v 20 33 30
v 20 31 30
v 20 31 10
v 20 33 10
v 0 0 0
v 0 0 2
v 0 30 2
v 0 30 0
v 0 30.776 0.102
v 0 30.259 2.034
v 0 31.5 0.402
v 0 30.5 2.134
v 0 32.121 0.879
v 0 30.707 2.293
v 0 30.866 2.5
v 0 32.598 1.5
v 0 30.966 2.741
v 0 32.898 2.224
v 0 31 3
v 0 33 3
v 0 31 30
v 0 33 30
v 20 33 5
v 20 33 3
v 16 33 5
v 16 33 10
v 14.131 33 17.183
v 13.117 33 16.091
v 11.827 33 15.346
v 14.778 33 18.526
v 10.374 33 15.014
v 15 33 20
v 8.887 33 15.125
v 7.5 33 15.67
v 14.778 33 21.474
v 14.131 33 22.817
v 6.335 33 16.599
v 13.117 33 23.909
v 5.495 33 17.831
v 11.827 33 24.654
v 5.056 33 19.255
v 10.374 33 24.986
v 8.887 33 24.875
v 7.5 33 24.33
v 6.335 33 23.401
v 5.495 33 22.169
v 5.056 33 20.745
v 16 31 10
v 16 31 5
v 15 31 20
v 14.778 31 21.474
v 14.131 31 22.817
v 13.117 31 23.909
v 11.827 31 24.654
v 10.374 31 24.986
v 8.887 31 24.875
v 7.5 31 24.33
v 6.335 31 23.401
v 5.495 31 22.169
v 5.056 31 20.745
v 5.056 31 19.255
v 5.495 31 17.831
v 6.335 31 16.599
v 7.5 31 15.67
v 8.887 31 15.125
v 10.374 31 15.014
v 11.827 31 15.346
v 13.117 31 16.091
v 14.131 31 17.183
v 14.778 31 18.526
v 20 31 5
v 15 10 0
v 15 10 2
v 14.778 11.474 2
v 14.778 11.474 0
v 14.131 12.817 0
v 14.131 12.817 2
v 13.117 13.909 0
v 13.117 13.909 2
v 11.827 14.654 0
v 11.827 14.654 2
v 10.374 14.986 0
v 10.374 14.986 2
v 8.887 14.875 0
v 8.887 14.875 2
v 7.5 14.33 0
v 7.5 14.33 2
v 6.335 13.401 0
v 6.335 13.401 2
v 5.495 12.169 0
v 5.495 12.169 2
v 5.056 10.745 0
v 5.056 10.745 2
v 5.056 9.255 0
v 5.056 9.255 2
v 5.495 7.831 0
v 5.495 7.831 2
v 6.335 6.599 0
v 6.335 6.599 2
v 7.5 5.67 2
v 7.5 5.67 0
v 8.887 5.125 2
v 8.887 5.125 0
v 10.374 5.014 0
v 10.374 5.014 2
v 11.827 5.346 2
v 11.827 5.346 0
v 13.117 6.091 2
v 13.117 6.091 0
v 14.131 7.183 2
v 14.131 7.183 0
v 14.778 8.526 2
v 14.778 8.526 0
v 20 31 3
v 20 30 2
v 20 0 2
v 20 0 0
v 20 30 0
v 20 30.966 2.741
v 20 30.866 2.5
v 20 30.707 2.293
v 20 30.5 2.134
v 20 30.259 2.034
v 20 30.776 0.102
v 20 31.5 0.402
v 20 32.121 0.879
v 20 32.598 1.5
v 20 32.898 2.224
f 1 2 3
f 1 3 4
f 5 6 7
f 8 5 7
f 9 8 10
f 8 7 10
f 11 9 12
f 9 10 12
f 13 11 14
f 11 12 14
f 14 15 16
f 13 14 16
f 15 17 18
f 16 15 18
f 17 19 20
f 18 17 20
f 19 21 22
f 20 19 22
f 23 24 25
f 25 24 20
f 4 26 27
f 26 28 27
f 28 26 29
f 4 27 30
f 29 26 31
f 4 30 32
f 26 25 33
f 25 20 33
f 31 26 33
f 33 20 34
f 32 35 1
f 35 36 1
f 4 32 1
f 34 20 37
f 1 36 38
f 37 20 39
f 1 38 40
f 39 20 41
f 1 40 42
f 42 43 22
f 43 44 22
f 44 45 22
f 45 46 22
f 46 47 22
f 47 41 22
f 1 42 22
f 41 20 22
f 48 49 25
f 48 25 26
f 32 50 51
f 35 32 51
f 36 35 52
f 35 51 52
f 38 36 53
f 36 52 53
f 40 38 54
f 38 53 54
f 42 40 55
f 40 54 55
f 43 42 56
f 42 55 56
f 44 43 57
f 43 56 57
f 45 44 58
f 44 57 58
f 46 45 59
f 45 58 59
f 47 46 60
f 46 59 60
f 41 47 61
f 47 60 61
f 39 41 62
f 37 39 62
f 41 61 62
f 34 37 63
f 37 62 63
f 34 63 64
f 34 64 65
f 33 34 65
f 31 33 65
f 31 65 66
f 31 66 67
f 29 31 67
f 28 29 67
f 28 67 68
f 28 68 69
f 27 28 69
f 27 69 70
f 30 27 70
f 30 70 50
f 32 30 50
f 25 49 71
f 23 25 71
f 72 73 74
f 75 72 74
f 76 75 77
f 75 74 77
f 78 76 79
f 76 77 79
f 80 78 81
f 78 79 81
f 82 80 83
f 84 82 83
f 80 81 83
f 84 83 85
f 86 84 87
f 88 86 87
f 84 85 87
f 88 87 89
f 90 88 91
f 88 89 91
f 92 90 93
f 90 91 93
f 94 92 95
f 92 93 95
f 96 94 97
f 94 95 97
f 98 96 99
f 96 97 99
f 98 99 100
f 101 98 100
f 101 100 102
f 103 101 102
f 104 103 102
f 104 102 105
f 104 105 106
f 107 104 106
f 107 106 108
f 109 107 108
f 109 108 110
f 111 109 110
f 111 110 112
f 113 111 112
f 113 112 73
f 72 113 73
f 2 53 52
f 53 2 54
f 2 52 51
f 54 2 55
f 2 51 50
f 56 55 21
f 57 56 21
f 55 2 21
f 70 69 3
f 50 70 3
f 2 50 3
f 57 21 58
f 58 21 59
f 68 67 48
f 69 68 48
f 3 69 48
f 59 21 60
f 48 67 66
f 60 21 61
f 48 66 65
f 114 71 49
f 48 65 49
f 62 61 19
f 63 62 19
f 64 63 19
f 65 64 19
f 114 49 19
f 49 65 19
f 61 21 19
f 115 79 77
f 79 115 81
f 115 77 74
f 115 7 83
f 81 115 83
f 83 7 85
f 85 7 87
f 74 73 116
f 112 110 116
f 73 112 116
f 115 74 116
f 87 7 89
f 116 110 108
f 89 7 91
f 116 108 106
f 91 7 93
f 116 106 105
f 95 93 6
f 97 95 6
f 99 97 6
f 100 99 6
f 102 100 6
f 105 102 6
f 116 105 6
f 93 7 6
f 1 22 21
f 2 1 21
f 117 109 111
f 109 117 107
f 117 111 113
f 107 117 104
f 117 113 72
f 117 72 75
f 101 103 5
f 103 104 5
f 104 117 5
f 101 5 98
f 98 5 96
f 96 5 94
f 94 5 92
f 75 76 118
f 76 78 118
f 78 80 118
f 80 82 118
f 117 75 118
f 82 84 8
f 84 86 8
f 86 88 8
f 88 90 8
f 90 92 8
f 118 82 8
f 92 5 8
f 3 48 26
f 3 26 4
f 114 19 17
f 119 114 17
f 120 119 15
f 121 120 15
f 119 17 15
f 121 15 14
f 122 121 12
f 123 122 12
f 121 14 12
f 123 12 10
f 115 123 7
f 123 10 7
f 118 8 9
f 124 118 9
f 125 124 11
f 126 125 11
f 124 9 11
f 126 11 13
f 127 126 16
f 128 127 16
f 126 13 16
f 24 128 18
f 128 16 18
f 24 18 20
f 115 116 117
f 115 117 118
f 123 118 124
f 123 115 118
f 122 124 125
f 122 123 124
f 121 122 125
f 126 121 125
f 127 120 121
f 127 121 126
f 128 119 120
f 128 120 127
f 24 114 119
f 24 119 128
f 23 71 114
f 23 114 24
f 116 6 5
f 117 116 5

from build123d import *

# Parameters (mm, degrees)
F1_DEPTH = 20
F2_R     = 5
F2_W     = 4
F2_H     = 5
F3_DEPTH = 25
F4_R     = 5
F5_DEPTH = 25


with BuildPart() as f1:
    # F0 (on Right) → F1 (new body)
    with BuildSketch(Plane.YZ):
        with BuildLine():
            Line((0, 2), (0, 0))
            Line((0, 0), (30, 0))
            ThreePointArc((30, 0), (32.12132, 0.87868), (33, 3))
            Line((33, 3), (33, 30))
            Line((33, 30), (31, 30))
            Line((31, 30), (31, 3))
            ThreePointArc((31, 3), (30.707107, 2.292893), (30, 2))
            Line((30, 2), (0, 2))
        make_face()
    extrude(amount=F1_DEPTH)

    # F2 (on face) → F3 (cut)
    with BuildSketch(Plane.XZ.offset(-31)):
        with Locations((10, 20)):
            Circle(F2_R)
        with Locations((18, 7.5)):
            Rectangle(F2_W, F2_H)
    extrude(amount=-F3_DEPTH, mode=Mode.SUBTRACT)

    # F4 (on face) → F5 (cut)
    with BuildSketch(Plane.XY.offset(2)):
        with Locations((10, 10)):
            Circle(F4_R)
    extrude(amount=-F5_DEPTH, mode=Mode.SUBTRACT)


solid = f1.part
